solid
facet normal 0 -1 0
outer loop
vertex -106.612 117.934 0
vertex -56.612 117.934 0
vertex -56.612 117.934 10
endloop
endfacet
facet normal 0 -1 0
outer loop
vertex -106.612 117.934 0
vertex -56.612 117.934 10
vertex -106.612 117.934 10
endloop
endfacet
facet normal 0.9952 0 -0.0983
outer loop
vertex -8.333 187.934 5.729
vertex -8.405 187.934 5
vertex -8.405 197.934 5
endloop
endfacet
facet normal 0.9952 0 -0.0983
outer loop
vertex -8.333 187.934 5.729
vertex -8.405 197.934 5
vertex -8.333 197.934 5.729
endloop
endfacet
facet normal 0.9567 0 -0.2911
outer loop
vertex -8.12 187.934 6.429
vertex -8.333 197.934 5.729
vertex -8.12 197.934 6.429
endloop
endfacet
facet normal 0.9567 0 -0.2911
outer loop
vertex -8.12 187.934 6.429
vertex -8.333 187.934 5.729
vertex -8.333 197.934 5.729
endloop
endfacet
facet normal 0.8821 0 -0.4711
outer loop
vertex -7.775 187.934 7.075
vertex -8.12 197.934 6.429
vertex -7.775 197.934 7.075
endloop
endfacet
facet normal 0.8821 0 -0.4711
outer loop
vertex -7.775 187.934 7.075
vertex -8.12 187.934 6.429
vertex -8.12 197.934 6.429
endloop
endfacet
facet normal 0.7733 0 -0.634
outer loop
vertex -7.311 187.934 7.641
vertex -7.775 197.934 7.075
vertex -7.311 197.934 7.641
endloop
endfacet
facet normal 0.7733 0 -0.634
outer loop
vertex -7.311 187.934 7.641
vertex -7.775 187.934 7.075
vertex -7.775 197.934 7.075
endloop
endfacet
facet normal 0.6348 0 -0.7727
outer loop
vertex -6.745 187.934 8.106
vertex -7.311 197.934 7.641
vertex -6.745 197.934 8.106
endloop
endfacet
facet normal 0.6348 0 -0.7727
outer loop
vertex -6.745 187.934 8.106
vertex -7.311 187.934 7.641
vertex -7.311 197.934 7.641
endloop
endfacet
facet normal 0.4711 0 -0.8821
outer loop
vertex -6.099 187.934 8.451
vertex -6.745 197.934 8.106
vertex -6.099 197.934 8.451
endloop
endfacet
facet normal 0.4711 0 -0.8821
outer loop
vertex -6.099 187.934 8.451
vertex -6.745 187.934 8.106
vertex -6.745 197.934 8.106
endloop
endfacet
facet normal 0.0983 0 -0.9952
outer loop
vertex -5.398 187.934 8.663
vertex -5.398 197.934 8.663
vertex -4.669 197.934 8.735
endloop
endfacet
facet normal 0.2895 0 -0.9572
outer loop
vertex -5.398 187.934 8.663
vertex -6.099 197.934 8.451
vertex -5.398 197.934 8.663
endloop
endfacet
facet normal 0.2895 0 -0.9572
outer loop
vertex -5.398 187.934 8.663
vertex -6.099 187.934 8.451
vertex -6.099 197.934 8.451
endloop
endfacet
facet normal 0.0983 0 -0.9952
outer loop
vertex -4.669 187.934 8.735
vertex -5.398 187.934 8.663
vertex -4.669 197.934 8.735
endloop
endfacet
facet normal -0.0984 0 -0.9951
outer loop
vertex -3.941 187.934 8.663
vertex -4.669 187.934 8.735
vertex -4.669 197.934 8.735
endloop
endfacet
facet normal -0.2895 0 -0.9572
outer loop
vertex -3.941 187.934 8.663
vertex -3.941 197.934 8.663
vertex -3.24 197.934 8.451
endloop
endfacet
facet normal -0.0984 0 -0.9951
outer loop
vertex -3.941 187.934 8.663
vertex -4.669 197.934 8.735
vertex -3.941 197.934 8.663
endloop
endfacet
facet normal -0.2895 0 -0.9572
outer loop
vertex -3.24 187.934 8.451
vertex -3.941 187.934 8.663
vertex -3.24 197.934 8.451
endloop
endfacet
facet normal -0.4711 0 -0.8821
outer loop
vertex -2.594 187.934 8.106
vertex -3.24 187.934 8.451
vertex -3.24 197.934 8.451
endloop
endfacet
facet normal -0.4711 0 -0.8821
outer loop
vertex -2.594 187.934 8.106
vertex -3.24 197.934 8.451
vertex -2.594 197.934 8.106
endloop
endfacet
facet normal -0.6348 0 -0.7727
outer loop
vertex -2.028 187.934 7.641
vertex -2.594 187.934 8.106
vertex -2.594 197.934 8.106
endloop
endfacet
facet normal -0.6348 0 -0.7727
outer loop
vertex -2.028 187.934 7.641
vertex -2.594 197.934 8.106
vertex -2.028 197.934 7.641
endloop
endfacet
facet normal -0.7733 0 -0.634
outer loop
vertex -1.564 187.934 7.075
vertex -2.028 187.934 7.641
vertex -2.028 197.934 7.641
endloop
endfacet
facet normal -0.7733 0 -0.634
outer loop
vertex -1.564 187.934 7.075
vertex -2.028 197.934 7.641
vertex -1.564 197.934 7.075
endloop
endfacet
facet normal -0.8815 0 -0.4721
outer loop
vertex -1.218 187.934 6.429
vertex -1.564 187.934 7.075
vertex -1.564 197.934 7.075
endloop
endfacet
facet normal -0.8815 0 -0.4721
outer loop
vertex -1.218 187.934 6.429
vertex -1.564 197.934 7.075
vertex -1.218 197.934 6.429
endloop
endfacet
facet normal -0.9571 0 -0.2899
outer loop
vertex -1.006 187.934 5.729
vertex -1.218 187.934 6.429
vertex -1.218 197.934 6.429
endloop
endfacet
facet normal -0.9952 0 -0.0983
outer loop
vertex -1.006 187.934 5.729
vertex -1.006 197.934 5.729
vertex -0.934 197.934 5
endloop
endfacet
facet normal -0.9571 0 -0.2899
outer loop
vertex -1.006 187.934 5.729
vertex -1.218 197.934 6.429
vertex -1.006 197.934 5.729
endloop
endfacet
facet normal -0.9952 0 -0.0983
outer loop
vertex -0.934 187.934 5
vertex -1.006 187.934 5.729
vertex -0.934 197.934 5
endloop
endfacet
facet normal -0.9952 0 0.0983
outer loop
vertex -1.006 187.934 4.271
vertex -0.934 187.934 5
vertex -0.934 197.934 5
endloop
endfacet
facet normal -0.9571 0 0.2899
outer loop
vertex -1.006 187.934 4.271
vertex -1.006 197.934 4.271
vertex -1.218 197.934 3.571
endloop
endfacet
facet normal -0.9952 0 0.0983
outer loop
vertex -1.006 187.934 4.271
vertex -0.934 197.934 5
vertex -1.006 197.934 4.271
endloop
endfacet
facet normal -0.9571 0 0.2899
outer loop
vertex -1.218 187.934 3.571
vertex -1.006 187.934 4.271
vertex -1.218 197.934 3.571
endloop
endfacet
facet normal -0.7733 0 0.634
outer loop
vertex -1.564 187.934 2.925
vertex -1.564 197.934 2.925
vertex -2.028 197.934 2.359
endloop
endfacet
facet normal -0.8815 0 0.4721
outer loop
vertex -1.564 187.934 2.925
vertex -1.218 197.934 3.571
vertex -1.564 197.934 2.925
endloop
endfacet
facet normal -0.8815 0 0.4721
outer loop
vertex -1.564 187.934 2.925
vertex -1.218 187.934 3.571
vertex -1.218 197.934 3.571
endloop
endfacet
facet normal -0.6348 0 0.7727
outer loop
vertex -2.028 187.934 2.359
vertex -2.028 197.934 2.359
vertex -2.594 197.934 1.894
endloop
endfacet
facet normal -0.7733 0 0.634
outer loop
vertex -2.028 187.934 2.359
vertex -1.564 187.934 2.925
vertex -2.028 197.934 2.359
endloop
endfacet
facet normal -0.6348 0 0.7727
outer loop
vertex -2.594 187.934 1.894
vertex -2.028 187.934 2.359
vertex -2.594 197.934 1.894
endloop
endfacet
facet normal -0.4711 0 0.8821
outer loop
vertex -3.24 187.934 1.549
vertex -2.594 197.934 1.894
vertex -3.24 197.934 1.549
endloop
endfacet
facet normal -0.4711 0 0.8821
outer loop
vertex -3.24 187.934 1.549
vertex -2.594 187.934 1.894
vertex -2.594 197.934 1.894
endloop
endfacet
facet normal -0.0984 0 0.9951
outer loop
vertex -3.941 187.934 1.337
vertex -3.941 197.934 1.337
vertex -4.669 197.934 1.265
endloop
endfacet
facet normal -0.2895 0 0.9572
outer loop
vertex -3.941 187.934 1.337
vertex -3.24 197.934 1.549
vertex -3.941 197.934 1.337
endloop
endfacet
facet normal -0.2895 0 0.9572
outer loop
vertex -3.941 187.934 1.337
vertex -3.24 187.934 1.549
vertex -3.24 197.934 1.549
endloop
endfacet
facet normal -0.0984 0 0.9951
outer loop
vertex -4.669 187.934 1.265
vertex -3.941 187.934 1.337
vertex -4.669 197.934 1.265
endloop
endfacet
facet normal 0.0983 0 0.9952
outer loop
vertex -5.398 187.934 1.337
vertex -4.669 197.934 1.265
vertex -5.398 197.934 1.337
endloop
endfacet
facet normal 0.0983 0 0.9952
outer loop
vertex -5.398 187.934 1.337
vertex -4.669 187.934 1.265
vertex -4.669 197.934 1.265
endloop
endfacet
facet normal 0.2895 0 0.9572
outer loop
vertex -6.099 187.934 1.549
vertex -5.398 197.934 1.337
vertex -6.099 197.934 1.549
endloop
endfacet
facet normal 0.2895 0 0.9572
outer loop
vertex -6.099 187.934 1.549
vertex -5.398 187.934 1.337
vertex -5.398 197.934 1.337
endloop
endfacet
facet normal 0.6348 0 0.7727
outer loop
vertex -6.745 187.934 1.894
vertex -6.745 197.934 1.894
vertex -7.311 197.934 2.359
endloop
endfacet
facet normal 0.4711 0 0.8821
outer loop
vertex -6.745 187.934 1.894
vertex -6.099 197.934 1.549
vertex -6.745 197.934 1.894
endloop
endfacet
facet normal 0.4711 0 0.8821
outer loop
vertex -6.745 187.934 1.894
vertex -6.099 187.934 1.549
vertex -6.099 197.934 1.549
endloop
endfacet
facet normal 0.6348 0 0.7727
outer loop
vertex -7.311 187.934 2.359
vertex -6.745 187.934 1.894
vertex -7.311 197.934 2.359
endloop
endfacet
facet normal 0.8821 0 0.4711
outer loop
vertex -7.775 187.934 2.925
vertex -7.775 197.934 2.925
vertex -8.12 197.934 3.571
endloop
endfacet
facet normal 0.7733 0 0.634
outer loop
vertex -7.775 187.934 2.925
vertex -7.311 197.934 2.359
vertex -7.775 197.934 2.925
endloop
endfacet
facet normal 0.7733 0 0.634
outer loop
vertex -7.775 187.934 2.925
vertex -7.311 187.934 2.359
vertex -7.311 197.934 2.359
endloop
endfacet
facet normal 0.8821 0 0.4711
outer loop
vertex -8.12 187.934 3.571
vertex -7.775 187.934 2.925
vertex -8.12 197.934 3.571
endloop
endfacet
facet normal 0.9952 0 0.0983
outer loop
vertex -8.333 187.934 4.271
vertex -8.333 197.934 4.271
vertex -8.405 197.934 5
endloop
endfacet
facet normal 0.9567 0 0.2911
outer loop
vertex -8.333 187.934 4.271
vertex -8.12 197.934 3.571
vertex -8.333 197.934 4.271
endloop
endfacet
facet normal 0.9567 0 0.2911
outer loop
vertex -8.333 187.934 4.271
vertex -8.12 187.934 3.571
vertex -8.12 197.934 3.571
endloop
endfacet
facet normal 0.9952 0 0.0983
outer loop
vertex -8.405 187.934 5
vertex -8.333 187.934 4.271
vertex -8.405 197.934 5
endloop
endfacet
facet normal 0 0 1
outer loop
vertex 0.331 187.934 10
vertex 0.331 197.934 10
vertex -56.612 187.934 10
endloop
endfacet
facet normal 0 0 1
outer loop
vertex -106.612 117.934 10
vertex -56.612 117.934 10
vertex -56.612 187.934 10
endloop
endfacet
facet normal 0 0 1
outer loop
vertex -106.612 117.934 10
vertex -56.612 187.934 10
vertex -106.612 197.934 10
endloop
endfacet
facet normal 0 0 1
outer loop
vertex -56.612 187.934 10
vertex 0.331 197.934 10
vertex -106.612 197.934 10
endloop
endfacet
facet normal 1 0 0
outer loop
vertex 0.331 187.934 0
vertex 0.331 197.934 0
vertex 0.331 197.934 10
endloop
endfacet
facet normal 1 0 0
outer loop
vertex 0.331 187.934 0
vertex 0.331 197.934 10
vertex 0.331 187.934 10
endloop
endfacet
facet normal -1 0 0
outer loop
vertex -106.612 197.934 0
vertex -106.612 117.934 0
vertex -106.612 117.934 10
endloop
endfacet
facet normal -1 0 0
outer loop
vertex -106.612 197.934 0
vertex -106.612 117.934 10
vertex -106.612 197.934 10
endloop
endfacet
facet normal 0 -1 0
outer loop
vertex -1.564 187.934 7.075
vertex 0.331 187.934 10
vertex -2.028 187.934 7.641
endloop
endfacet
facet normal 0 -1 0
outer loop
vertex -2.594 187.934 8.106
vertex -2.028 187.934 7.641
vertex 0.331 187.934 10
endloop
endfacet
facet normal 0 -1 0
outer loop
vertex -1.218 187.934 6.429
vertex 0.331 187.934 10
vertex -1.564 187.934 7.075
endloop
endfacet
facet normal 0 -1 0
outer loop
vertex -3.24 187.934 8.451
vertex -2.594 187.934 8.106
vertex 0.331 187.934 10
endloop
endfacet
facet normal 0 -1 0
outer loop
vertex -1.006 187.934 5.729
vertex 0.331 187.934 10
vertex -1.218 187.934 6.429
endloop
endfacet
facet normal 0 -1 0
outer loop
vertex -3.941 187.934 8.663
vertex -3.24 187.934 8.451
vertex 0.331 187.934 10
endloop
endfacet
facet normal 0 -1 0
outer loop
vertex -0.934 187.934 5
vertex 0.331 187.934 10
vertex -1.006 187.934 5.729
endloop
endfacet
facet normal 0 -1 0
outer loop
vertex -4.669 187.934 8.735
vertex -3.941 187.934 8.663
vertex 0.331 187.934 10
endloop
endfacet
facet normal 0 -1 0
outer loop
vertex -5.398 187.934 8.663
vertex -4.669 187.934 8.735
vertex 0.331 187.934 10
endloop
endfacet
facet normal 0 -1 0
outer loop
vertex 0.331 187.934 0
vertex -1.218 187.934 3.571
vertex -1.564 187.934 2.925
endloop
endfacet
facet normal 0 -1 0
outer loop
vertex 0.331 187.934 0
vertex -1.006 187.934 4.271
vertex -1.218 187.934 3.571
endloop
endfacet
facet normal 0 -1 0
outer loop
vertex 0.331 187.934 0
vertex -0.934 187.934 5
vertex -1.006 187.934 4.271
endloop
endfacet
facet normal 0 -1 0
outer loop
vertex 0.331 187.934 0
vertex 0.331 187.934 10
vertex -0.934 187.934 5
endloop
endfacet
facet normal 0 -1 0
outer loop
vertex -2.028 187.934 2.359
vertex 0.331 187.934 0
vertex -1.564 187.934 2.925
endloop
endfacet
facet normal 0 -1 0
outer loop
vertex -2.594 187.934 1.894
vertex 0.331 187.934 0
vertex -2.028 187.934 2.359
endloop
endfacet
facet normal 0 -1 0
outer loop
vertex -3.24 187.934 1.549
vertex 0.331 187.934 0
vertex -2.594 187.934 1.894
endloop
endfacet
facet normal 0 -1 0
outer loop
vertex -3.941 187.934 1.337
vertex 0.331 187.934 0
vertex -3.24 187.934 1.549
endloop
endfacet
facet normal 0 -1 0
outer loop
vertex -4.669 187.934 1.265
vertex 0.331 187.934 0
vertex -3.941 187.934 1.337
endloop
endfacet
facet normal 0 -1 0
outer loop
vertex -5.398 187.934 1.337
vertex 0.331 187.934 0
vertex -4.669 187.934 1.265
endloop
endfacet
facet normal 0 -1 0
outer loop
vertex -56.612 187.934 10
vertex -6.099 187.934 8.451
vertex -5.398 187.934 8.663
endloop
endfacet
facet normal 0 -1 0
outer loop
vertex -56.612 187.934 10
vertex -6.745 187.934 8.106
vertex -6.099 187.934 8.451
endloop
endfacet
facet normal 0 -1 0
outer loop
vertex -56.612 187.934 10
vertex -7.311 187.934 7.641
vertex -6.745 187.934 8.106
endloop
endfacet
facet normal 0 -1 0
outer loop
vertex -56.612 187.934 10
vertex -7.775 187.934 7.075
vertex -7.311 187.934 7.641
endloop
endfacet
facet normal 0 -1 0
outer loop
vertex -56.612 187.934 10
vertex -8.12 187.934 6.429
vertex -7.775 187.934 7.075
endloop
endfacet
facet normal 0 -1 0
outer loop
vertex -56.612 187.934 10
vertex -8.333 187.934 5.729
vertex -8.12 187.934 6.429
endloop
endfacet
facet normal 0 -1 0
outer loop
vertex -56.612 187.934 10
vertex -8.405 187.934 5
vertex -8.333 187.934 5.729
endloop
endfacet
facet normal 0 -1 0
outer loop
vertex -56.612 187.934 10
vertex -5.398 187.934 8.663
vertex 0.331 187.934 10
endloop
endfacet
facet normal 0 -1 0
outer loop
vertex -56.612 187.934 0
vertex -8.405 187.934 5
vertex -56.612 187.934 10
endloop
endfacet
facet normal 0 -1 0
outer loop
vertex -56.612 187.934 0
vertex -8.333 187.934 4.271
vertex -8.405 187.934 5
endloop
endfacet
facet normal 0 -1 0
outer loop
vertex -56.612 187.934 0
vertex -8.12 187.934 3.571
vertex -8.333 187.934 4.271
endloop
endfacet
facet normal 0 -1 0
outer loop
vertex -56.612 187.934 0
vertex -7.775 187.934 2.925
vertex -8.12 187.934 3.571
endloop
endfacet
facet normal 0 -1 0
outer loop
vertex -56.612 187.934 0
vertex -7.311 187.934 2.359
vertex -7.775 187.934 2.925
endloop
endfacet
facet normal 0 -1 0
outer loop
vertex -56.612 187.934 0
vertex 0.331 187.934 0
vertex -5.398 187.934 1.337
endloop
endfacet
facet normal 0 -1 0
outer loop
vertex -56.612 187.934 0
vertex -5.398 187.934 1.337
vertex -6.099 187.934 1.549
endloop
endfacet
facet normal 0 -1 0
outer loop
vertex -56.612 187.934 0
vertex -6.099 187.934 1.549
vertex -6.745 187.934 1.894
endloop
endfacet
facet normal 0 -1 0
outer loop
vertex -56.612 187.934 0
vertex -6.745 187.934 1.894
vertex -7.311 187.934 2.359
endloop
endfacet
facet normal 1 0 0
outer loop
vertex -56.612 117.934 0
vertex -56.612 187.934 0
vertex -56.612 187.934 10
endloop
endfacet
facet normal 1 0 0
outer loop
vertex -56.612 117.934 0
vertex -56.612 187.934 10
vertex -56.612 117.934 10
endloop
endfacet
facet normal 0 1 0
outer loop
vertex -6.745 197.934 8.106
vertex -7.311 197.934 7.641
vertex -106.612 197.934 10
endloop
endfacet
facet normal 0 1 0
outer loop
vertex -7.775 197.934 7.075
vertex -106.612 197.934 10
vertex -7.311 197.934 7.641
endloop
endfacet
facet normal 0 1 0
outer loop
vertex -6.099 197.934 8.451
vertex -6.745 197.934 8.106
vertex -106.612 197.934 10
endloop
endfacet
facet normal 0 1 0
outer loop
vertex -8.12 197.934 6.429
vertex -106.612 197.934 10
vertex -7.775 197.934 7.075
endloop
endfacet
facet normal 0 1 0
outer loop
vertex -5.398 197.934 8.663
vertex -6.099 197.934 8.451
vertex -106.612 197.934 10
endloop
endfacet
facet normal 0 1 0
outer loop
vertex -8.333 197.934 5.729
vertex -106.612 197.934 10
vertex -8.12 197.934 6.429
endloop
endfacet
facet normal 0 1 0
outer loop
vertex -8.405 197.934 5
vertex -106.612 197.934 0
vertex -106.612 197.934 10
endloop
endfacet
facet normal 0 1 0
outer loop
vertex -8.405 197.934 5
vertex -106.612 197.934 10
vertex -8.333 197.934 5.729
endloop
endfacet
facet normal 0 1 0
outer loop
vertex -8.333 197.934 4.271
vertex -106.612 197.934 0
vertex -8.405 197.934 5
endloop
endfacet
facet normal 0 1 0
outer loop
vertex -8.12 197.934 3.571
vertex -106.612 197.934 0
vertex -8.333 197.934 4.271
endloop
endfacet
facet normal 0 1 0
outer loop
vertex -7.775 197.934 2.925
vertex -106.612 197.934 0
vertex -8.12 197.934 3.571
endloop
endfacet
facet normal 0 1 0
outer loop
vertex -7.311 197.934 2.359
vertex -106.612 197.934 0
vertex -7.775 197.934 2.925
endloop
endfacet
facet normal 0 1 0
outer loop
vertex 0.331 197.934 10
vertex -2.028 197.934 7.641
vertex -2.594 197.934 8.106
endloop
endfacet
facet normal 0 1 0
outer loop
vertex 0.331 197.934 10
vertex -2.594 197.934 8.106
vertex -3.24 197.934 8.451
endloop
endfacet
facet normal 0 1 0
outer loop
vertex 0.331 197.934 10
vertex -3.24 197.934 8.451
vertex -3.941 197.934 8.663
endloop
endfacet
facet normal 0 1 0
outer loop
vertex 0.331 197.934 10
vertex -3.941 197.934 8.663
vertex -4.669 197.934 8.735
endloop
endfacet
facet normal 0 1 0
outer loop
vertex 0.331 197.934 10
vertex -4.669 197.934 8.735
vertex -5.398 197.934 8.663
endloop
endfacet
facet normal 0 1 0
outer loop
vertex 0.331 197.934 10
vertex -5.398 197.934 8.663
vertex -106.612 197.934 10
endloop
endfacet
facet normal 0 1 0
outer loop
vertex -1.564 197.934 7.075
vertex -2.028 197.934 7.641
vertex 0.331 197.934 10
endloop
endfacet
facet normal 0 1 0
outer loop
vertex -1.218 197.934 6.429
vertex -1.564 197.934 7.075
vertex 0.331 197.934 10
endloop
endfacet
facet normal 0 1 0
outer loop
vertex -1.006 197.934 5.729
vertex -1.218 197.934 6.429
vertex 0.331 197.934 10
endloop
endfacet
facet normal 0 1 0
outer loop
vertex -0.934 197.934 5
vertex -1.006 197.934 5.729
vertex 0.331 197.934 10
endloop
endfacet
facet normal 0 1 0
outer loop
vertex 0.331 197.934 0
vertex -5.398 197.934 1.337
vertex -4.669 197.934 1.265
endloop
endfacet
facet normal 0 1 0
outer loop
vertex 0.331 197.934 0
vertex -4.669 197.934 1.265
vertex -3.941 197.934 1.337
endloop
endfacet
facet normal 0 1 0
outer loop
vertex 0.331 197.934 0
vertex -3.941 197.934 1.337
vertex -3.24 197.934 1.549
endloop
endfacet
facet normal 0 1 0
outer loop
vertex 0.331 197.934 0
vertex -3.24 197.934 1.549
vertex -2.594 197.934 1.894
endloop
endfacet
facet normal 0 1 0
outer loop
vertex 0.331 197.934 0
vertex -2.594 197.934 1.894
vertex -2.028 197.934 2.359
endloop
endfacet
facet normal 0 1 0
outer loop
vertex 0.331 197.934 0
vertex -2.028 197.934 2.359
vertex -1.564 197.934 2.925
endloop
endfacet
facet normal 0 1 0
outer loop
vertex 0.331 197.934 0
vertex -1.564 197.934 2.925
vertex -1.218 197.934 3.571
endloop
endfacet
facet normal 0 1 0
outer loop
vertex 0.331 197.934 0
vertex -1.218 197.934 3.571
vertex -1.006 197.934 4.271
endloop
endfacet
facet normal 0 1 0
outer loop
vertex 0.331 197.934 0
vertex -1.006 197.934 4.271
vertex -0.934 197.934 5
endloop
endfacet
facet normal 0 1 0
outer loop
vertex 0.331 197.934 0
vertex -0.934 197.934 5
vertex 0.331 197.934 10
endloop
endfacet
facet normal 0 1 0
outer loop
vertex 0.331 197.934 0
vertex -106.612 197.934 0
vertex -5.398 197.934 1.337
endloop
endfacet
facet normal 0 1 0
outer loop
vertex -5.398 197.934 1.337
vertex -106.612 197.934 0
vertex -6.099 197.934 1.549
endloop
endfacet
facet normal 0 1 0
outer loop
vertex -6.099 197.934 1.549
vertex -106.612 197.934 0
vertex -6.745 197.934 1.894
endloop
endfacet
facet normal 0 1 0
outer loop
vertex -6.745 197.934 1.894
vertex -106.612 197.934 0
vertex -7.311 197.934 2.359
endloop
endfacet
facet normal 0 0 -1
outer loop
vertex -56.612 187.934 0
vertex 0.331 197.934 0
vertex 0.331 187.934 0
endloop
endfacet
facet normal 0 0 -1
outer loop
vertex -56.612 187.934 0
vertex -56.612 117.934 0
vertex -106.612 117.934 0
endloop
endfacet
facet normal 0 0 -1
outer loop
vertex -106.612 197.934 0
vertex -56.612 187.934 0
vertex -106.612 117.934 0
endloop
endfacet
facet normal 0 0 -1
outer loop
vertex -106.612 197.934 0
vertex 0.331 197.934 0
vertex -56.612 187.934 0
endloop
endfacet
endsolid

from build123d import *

# Parameters (mm, degrees)
BOSS_EXTRUDE1_DEPTH     = 10
CUT_EXTRUDE1_DEPTH      = 134.663857908
CUT_EXTRUDE1_DEPTH_BACK = 134.663857908
SKETCH2_R               = 3.735264888


with BuildPart() as part:
    # Sketch1 → Boss-Extrude1 (new body)
    with BuildSketch(Plane.XY):
        Polygon((0.330578512, 197.933884298), (0.330578512, 187.933884298), (-56.611570248, 187.933884298), (-56.611570248, 117.933884298), (-106.611570248, 117.933884298), (-106.611570248, 197.933884298), align=None)
    extrude(amount=BOSS_EXTRUDE1_DEPTH)

    # Sketch2 → Cut-Extrude1 (cut, two sides: drawn at the far end of the back side and taken through both)
    with BuildSketch(Plane(origin=(0, 197.933884298, 0), x_dir=(1, 0, 0), z_dir=(0, 1, 0)).offset(-CUT_EXTRUDE1_DEPTH_BACK)):
        with Locations(Location((-4.669421488, -5, 0), (0, 0, 180))):
            Circle(SKETCH2_R)
    extrude(amount=CUT_EXTRUDE1_DEPTH + CUT_EXTRUDE1_DEPTH_BACK, mode=Mode.SUBTRACT)


solid = part.part
